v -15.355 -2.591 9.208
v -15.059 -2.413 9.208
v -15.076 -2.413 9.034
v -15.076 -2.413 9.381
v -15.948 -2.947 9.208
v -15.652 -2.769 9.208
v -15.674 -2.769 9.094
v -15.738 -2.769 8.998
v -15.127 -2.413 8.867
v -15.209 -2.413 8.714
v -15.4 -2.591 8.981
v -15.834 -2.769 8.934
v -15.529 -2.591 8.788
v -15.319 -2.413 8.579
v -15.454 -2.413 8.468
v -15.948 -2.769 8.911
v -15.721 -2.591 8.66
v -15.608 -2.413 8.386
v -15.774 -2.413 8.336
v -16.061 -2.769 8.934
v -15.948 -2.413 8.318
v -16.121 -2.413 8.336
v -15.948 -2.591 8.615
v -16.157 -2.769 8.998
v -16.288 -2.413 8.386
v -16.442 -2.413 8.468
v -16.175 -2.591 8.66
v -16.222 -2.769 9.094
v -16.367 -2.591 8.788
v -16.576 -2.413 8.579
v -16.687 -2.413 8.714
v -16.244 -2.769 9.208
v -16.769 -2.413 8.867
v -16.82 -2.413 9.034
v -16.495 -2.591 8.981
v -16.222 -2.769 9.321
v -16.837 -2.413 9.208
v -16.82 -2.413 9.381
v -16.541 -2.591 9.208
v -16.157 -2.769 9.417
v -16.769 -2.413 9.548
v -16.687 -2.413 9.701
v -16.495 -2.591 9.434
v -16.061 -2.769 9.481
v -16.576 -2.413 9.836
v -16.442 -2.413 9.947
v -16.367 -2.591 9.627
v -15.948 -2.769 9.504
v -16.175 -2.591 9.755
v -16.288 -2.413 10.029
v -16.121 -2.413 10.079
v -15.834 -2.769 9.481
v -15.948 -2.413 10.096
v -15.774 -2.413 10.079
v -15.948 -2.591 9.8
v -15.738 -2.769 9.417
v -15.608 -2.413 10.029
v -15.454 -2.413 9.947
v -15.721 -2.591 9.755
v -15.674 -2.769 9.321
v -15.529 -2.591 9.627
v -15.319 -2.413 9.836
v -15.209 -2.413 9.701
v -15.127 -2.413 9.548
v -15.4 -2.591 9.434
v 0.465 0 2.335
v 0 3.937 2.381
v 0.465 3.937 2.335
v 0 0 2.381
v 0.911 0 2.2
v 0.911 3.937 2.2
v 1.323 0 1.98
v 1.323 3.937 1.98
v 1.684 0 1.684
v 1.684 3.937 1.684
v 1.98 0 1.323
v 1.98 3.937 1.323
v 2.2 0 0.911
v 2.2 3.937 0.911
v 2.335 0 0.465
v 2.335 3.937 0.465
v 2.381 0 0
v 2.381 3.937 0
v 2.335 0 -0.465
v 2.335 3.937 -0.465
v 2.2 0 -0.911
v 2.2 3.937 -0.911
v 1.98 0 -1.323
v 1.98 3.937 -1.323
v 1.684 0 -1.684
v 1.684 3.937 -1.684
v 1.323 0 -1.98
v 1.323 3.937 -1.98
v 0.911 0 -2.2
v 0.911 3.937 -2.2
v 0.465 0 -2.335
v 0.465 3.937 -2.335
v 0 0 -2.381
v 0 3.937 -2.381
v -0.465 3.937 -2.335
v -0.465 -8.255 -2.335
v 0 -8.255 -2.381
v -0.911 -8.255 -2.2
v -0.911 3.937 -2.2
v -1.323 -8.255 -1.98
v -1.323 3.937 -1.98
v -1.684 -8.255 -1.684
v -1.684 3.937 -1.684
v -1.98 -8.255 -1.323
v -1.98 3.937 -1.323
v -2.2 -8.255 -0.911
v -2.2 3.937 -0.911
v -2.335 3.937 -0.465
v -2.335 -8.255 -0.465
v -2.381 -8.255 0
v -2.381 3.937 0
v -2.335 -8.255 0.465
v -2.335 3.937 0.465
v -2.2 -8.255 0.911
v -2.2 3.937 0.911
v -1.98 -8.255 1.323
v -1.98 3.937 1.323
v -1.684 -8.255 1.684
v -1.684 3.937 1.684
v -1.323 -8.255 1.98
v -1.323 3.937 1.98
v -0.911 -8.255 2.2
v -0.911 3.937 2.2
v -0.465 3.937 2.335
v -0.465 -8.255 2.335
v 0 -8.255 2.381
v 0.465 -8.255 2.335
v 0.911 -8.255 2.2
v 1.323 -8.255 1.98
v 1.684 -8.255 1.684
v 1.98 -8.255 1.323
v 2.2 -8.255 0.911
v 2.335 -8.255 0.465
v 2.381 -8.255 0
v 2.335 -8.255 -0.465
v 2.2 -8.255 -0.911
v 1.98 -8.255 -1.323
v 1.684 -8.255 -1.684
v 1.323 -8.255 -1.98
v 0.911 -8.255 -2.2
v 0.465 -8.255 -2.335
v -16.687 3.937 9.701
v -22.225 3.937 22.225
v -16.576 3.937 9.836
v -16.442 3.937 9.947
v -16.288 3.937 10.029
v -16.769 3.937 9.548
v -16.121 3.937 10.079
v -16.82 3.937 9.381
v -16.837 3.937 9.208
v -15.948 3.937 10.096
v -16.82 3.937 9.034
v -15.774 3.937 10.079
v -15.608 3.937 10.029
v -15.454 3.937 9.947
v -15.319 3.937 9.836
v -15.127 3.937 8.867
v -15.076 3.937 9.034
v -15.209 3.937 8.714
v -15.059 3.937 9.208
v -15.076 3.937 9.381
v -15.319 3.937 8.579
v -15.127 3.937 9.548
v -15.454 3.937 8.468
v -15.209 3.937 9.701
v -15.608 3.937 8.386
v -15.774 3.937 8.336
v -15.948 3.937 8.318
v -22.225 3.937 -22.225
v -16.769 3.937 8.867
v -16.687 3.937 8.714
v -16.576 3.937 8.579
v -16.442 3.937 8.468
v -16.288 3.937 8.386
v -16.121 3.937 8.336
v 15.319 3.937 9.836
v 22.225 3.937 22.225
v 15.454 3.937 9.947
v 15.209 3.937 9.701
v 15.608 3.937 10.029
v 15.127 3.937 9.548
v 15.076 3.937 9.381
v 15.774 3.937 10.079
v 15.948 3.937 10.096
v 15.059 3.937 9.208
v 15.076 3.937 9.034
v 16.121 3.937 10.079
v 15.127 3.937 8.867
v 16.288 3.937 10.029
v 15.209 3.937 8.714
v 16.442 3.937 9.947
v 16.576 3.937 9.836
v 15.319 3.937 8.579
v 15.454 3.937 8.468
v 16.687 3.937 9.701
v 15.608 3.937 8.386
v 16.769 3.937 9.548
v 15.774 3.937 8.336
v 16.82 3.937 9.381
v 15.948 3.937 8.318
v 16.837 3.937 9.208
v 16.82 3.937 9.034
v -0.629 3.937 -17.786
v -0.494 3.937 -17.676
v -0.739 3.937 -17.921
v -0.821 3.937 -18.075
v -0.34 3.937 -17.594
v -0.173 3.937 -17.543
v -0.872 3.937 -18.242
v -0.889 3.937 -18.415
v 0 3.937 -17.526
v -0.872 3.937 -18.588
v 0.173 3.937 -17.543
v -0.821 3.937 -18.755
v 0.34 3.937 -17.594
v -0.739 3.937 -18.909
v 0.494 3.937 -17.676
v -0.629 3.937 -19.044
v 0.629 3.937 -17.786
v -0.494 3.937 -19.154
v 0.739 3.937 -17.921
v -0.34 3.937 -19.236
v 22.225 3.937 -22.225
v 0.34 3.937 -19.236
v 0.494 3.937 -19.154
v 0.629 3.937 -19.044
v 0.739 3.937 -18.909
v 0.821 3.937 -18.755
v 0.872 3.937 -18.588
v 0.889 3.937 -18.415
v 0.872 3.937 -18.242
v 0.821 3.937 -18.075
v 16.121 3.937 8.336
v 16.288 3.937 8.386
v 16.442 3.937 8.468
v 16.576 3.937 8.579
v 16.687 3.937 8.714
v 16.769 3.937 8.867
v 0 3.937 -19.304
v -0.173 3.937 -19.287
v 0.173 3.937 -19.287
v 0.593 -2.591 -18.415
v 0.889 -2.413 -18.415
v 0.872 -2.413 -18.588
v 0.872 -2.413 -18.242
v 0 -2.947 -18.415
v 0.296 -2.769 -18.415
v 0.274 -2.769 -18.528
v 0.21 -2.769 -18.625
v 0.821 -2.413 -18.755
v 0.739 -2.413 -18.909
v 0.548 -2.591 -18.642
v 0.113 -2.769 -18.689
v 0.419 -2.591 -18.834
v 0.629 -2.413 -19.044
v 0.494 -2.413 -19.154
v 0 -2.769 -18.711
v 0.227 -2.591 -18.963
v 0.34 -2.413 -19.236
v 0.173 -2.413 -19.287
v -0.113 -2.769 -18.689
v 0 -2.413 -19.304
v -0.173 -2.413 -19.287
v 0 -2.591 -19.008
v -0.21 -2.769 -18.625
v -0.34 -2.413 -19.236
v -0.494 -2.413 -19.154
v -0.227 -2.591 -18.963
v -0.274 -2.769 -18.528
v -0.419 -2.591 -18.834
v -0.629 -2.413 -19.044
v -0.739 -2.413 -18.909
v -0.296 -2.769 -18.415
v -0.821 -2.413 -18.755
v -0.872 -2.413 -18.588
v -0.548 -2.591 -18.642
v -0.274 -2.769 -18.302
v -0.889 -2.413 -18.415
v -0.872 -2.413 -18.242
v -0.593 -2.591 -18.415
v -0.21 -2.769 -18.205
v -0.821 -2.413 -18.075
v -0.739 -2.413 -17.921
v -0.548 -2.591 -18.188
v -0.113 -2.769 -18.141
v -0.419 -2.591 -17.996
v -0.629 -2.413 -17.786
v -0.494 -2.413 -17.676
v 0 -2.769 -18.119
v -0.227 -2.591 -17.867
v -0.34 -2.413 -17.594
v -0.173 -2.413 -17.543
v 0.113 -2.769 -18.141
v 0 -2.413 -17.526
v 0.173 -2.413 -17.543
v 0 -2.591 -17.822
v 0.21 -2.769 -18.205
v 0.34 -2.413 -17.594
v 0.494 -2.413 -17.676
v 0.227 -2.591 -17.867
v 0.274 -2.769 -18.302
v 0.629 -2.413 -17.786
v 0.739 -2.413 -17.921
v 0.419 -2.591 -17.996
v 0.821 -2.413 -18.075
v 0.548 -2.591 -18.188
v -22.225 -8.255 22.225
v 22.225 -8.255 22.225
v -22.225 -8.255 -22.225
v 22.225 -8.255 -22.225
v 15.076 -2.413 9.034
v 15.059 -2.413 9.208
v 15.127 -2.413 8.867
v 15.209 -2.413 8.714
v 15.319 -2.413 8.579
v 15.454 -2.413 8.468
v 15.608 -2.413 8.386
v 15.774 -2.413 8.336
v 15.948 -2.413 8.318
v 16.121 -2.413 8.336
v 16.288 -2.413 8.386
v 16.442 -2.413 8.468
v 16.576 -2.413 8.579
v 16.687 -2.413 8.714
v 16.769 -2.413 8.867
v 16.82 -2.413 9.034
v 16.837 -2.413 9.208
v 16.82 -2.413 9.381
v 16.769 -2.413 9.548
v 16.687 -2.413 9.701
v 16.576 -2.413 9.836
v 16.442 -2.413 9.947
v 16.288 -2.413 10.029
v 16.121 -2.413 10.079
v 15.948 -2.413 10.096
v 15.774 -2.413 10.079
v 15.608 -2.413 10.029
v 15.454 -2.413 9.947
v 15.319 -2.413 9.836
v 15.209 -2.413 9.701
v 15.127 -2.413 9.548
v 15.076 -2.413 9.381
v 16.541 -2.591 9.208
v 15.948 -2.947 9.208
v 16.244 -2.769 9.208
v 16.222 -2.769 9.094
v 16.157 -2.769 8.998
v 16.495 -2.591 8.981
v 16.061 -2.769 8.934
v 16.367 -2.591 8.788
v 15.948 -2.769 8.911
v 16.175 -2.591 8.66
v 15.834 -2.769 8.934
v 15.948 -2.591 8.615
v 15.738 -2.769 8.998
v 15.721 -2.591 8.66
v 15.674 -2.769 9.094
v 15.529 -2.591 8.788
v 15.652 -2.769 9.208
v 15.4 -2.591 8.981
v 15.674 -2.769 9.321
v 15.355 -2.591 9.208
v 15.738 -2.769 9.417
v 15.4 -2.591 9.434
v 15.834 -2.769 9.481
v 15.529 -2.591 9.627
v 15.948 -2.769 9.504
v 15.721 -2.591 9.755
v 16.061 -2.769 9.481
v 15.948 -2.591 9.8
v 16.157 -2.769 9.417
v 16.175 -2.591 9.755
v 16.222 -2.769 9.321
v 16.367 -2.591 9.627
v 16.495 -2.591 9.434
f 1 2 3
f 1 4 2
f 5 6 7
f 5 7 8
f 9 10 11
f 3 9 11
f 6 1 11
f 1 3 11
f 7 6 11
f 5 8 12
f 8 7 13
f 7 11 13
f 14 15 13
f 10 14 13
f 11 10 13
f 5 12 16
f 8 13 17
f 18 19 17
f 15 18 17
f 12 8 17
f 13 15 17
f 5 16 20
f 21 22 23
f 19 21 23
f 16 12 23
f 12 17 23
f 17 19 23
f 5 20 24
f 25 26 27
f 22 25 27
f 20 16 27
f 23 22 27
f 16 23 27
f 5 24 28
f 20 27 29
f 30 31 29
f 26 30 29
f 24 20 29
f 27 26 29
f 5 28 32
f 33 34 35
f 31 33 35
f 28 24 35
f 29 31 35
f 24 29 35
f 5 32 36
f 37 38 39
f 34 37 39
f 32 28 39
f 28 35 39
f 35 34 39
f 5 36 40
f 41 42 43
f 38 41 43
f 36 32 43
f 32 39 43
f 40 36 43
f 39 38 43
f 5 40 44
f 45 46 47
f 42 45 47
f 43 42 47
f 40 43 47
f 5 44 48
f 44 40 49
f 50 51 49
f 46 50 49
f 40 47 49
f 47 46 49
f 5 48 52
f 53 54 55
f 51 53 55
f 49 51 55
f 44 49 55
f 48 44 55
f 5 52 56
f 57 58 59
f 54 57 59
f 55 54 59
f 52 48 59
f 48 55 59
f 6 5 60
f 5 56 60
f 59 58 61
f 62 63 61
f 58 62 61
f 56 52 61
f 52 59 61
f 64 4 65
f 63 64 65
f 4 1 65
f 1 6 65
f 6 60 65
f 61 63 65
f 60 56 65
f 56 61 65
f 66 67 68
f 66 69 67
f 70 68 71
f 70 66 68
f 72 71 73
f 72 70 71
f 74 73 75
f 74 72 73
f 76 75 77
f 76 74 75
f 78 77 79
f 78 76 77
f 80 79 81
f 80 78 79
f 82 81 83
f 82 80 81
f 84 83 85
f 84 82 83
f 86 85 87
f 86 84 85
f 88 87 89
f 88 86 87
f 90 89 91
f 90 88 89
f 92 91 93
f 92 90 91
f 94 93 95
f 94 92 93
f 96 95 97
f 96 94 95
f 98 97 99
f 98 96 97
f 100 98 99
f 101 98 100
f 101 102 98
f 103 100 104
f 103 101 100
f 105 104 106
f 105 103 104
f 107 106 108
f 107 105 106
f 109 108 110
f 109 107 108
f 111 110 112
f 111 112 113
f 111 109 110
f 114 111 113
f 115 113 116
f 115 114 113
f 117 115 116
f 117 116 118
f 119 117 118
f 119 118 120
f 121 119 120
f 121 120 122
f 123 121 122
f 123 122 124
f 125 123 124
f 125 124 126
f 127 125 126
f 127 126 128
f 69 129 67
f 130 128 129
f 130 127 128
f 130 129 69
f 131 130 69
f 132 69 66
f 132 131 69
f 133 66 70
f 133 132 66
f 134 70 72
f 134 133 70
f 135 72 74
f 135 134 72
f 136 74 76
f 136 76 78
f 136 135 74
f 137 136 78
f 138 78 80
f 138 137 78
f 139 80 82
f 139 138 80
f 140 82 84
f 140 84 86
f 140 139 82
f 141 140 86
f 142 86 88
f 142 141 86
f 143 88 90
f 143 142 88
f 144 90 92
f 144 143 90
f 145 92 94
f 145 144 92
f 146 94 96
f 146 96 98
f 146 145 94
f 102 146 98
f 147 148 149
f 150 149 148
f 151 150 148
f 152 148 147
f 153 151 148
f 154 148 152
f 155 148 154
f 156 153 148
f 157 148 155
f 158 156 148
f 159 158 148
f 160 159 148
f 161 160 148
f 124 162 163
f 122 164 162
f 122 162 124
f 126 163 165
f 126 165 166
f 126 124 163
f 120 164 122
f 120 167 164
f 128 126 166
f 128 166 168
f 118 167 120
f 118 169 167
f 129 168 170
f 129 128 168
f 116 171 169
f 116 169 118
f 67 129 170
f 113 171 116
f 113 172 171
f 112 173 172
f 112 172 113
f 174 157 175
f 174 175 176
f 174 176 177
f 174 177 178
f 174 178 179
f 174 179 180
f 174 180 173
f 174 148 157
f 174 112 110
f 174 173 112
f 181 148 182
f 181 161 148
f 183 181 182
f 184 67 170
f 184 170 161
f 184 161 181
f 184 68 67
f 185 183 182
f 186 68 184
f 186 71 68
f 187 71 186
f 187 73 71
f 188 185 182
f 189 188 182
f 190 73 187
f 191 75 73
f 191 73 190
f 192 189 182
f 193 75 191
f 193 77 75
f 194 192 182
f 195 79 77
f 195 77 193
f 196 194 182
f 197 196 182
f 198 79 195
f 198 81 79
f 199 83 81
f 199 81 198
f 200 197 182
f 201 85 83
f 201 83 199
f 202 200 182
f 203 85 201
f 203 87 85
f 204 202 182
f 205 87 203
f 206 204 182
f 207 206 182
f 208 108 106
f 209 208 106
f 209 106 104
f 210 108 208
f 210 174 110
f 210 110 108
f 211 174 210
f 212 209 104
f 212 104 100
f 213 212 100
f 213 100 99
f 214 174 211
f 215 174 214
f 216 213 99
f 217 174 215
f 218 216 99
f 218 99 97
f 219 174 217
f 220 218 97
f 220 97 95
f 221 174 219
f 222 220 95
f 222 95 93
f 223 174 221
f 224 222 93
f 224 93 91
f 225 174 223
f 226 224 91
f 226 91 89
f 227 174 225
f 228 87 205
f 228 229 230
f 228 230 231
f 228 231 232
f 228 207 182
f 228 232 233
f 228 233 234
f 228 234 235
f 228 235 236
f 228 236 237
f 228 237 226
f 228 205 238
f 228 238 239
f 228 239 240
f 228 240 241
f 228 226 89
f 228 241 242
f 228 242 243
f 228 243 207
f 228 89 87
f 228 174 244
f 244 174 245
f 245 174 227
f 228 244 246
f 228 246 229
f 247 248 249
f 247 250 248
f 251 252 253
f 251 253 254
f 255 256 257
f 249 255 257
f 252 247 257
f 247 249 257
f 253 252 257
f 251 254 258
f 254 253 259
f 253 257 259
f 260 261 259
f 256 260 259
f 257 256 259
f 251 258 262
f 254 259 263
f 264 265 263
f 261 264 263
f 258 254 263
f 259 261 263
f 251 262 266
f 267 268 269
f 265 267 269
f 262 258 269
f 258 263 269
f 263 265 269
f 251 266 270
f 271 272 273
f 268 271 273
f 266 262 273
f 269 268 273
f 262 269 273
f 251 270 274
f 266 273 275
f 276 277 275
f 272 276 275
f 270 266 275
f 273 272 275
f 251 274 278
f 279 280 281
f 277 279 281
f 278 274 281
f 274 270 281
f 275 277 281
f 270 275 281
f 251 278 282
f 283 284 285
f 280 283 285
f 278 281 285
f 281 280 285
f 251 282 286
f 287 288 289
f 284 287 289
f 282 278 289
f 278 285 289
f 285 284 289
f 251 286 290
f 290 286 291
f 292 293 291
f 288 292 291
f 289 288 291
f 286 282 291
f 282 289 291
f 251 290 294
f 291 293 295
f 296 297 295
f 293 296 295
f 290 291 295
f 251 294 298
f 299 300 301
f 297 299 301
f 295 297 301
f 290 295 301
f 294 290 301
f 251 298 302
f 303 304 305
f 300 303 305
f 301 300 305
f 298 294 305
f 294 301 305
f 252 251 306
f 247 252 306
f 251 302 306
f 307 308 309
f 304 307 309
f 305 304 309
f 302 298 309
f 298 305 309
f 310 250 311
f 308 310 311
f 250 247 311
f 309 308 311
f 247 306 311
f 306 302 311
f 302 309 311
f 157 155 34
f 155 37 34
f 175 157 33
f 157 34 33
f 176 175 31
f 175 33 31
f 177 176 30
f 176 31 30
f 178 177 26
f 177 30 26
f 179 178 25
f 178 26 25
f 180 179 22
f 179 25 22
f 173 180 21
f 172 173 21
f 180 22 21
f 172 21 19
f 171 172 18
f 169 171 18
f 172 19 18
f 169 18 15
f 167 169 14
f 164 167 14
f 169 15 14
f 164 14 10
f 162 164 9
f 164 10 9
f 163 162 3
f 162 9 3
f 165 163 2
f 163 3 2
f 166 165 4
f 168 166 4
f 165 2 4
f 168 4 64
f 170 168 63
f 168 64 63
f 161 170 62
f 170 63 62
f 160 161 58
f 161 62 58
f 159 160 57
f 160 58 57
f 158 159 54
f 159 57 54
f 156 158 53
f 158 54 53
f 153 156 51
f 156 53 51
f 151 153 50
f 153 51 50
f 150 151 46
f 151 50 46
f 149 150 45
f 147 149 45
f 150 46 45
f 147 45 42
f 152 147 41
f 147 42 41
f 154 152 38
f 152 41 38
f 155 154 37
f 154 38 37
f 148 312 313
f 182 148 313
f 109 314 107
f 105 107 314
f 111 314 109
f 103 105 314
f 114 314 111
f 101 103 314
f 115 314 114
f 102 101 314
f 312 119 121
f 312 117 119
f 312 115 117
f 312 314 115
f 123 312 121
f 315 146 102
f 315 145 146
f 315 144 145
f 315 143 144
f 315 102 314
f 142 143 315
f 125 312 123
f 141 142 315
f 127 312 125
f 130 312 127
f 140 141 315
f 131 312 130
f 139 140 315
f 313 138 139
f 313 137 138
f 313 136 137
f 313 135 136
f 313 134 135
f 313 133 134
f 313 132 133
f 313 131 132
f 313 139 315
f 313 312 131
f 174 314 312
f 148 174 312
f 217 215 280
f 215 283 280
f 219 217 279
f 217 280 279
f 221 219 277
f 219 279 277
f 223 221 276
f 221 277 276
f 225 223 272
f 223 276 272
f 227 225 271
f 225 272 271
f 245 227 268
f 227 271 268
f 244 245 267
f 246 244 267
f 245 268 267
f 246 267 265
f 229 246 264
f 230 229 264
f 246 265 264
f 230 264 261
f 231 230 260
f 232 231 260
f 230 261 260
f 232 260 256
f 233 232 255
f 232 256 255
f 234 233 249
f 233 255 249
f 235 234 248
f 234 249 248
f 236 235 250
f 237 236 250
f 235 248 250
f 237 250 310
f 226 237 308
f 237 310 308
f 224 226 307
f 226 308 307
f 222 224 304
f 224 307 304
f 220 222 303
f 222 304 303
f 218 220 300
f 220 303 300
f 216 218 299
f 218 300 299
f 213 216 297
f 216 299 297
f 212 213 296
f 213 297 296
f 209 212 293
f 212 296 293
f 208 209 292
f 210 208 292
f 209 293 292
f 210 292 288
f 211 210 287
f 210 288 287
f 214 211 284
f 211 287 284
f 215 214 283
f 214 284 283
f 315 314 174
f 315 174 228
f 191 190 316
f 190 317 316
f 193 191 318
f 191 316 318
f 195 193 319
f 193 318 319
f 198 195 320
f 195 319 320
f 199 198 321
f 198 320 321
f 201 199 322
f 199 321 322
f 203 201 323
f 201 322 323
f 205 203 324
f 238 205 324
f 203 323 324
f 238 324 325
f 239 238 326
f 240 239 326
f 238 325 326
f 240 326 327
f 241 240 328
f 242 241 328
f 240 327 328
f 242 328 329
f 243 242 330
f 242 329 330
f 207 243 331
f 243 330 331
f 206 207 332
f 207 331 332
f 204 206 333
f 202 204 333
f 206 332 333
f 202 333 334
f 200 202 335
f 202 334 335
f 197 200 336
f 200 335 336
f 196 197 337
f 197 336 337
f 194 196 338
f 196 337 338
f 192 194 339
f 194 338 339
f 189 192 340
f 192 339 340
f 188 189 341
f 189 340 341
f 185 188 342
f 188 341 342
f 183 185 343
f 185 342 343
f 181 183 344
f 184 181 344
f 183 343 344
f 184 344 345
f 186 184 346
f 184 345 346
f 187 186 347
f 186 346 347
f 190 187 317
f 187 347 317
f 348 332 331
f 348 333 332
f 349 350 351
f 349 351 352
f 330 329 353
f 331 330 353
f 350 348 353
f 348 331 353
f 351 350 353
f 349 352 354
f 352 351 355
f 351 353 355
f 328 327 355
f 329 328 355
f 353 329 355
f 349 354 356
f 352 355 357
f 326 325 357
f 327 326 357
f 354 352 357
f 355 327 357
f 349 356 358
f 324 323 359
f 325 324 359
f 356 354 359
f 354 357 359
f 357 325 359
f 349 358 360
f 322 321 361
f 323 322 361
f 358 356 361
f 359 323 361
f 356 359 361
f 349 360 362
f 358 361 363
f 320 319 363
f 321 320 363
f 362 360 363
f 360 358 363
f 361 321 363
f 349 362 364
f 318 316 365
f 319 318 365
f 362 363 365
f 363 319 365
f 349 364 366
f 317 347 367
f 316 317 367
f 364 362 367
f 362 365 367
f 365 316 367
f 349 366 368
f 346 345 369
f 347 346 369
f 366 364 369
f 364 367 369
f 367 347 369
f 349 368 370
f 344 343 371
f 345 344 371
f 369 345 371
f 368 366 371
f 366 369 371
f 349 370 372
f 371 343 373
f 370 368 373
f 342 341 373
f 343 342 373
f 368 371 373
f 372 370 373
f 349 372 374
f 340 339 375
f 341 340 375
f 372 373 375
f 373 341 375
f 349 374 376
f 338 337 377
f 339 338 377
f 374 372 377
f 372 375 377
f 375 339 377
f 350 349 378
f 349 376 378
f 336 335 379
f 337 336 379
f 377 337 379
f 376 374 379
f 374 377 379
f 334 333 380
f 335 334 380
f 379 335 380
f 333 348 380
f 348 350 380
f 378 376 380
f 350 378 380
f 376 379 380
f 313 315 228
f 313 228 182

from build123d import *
from build123d.topology import SkipClean

# Parameters (mm, degrees)
SKETCH1_W                 = 44.45
SKETCH1_H                 = 44.45
SKETCH1_R                 = 2.38125
BOSS_EXTRUDE1_DEPTH       = 3.937
BOSS_EXTRUDE2_START       = 8.255
SKETCH3_W                 = 44.45
SKETCH3_H                 = 44.45
SKETCH3_R                 = 2.38125
BOSS_EXTRUDE2_DEPTH       = 8.255
F_2_56_TAPPED_HOLE1_D     = 1.778
F_2_56_TAPPED_HOLE1_DEPTH = 6.35
F_2_56_TAPPED_HOLE1_TIP   = 0.53416509


with BuildPart() as part:
    # Sketch1 → Boss-Extrude1 (new body)
    with BuildSketch(Plane(origin=(0, 0, 0), x_dir=(1, 0, 0), z_dir=(0, 1, 0))):
        Rectangle(SKETCH1_W, SKETCH1_H)
        with Locations(Location((0, 0, 0), (0, 0, 270))):
            Circle(SKETCH1_R, mode=Mode.SUBTRACT)
    extrude(amount=BOSS_EXTRUDE1_DEPTH)

    # Sketch3 → Boss-Extrude2 (add)
    with SkipClean():  # the faces are left unmerged after this step: merging them gives an invalid solid
        with BuildSketch(Plane.XZ.offset(BOSS_EXTRUDE2_START)):
            Rectangle(SKETCH3_W, SKETCH3_H)
            with Locations(Location((0, 0, 0), (0, 0, 270))):
                Circle(SKETCH3_R, mode=Mode.SUBTRACT)
        extrude(amount=-BOSS_EXTRUDE2_DEPTH)

    # #2-56 Tapped Hole1
    with Locations(Plane(origin=(0, 3.937, 0), x_dir=(1, 0, 0), z_dir=(0, 1, 0))):
        with Locations((15.947857811, -9.2075), (-15.947857811, -9.2075), (0, 18.415)):
            Hole(F_2_56_TAPPED_HOLE1_D / 2, depth=F_2_56_TAPPED_HOLE1_DEPTH)
            with Locations((0, 0, -(F_2_56_TAPPED_HOLE1_DEPTH + F_2_56_TAPPED_HOLE1_TIP / 2))):  # 118° drill point
                Cone(0, F_2_56_TAPPED_HOLE1_D / 2, F_2_56_TAPPED_HOLE1_TIP, mode=Mode.SUBTRACT)


solid = part.part
